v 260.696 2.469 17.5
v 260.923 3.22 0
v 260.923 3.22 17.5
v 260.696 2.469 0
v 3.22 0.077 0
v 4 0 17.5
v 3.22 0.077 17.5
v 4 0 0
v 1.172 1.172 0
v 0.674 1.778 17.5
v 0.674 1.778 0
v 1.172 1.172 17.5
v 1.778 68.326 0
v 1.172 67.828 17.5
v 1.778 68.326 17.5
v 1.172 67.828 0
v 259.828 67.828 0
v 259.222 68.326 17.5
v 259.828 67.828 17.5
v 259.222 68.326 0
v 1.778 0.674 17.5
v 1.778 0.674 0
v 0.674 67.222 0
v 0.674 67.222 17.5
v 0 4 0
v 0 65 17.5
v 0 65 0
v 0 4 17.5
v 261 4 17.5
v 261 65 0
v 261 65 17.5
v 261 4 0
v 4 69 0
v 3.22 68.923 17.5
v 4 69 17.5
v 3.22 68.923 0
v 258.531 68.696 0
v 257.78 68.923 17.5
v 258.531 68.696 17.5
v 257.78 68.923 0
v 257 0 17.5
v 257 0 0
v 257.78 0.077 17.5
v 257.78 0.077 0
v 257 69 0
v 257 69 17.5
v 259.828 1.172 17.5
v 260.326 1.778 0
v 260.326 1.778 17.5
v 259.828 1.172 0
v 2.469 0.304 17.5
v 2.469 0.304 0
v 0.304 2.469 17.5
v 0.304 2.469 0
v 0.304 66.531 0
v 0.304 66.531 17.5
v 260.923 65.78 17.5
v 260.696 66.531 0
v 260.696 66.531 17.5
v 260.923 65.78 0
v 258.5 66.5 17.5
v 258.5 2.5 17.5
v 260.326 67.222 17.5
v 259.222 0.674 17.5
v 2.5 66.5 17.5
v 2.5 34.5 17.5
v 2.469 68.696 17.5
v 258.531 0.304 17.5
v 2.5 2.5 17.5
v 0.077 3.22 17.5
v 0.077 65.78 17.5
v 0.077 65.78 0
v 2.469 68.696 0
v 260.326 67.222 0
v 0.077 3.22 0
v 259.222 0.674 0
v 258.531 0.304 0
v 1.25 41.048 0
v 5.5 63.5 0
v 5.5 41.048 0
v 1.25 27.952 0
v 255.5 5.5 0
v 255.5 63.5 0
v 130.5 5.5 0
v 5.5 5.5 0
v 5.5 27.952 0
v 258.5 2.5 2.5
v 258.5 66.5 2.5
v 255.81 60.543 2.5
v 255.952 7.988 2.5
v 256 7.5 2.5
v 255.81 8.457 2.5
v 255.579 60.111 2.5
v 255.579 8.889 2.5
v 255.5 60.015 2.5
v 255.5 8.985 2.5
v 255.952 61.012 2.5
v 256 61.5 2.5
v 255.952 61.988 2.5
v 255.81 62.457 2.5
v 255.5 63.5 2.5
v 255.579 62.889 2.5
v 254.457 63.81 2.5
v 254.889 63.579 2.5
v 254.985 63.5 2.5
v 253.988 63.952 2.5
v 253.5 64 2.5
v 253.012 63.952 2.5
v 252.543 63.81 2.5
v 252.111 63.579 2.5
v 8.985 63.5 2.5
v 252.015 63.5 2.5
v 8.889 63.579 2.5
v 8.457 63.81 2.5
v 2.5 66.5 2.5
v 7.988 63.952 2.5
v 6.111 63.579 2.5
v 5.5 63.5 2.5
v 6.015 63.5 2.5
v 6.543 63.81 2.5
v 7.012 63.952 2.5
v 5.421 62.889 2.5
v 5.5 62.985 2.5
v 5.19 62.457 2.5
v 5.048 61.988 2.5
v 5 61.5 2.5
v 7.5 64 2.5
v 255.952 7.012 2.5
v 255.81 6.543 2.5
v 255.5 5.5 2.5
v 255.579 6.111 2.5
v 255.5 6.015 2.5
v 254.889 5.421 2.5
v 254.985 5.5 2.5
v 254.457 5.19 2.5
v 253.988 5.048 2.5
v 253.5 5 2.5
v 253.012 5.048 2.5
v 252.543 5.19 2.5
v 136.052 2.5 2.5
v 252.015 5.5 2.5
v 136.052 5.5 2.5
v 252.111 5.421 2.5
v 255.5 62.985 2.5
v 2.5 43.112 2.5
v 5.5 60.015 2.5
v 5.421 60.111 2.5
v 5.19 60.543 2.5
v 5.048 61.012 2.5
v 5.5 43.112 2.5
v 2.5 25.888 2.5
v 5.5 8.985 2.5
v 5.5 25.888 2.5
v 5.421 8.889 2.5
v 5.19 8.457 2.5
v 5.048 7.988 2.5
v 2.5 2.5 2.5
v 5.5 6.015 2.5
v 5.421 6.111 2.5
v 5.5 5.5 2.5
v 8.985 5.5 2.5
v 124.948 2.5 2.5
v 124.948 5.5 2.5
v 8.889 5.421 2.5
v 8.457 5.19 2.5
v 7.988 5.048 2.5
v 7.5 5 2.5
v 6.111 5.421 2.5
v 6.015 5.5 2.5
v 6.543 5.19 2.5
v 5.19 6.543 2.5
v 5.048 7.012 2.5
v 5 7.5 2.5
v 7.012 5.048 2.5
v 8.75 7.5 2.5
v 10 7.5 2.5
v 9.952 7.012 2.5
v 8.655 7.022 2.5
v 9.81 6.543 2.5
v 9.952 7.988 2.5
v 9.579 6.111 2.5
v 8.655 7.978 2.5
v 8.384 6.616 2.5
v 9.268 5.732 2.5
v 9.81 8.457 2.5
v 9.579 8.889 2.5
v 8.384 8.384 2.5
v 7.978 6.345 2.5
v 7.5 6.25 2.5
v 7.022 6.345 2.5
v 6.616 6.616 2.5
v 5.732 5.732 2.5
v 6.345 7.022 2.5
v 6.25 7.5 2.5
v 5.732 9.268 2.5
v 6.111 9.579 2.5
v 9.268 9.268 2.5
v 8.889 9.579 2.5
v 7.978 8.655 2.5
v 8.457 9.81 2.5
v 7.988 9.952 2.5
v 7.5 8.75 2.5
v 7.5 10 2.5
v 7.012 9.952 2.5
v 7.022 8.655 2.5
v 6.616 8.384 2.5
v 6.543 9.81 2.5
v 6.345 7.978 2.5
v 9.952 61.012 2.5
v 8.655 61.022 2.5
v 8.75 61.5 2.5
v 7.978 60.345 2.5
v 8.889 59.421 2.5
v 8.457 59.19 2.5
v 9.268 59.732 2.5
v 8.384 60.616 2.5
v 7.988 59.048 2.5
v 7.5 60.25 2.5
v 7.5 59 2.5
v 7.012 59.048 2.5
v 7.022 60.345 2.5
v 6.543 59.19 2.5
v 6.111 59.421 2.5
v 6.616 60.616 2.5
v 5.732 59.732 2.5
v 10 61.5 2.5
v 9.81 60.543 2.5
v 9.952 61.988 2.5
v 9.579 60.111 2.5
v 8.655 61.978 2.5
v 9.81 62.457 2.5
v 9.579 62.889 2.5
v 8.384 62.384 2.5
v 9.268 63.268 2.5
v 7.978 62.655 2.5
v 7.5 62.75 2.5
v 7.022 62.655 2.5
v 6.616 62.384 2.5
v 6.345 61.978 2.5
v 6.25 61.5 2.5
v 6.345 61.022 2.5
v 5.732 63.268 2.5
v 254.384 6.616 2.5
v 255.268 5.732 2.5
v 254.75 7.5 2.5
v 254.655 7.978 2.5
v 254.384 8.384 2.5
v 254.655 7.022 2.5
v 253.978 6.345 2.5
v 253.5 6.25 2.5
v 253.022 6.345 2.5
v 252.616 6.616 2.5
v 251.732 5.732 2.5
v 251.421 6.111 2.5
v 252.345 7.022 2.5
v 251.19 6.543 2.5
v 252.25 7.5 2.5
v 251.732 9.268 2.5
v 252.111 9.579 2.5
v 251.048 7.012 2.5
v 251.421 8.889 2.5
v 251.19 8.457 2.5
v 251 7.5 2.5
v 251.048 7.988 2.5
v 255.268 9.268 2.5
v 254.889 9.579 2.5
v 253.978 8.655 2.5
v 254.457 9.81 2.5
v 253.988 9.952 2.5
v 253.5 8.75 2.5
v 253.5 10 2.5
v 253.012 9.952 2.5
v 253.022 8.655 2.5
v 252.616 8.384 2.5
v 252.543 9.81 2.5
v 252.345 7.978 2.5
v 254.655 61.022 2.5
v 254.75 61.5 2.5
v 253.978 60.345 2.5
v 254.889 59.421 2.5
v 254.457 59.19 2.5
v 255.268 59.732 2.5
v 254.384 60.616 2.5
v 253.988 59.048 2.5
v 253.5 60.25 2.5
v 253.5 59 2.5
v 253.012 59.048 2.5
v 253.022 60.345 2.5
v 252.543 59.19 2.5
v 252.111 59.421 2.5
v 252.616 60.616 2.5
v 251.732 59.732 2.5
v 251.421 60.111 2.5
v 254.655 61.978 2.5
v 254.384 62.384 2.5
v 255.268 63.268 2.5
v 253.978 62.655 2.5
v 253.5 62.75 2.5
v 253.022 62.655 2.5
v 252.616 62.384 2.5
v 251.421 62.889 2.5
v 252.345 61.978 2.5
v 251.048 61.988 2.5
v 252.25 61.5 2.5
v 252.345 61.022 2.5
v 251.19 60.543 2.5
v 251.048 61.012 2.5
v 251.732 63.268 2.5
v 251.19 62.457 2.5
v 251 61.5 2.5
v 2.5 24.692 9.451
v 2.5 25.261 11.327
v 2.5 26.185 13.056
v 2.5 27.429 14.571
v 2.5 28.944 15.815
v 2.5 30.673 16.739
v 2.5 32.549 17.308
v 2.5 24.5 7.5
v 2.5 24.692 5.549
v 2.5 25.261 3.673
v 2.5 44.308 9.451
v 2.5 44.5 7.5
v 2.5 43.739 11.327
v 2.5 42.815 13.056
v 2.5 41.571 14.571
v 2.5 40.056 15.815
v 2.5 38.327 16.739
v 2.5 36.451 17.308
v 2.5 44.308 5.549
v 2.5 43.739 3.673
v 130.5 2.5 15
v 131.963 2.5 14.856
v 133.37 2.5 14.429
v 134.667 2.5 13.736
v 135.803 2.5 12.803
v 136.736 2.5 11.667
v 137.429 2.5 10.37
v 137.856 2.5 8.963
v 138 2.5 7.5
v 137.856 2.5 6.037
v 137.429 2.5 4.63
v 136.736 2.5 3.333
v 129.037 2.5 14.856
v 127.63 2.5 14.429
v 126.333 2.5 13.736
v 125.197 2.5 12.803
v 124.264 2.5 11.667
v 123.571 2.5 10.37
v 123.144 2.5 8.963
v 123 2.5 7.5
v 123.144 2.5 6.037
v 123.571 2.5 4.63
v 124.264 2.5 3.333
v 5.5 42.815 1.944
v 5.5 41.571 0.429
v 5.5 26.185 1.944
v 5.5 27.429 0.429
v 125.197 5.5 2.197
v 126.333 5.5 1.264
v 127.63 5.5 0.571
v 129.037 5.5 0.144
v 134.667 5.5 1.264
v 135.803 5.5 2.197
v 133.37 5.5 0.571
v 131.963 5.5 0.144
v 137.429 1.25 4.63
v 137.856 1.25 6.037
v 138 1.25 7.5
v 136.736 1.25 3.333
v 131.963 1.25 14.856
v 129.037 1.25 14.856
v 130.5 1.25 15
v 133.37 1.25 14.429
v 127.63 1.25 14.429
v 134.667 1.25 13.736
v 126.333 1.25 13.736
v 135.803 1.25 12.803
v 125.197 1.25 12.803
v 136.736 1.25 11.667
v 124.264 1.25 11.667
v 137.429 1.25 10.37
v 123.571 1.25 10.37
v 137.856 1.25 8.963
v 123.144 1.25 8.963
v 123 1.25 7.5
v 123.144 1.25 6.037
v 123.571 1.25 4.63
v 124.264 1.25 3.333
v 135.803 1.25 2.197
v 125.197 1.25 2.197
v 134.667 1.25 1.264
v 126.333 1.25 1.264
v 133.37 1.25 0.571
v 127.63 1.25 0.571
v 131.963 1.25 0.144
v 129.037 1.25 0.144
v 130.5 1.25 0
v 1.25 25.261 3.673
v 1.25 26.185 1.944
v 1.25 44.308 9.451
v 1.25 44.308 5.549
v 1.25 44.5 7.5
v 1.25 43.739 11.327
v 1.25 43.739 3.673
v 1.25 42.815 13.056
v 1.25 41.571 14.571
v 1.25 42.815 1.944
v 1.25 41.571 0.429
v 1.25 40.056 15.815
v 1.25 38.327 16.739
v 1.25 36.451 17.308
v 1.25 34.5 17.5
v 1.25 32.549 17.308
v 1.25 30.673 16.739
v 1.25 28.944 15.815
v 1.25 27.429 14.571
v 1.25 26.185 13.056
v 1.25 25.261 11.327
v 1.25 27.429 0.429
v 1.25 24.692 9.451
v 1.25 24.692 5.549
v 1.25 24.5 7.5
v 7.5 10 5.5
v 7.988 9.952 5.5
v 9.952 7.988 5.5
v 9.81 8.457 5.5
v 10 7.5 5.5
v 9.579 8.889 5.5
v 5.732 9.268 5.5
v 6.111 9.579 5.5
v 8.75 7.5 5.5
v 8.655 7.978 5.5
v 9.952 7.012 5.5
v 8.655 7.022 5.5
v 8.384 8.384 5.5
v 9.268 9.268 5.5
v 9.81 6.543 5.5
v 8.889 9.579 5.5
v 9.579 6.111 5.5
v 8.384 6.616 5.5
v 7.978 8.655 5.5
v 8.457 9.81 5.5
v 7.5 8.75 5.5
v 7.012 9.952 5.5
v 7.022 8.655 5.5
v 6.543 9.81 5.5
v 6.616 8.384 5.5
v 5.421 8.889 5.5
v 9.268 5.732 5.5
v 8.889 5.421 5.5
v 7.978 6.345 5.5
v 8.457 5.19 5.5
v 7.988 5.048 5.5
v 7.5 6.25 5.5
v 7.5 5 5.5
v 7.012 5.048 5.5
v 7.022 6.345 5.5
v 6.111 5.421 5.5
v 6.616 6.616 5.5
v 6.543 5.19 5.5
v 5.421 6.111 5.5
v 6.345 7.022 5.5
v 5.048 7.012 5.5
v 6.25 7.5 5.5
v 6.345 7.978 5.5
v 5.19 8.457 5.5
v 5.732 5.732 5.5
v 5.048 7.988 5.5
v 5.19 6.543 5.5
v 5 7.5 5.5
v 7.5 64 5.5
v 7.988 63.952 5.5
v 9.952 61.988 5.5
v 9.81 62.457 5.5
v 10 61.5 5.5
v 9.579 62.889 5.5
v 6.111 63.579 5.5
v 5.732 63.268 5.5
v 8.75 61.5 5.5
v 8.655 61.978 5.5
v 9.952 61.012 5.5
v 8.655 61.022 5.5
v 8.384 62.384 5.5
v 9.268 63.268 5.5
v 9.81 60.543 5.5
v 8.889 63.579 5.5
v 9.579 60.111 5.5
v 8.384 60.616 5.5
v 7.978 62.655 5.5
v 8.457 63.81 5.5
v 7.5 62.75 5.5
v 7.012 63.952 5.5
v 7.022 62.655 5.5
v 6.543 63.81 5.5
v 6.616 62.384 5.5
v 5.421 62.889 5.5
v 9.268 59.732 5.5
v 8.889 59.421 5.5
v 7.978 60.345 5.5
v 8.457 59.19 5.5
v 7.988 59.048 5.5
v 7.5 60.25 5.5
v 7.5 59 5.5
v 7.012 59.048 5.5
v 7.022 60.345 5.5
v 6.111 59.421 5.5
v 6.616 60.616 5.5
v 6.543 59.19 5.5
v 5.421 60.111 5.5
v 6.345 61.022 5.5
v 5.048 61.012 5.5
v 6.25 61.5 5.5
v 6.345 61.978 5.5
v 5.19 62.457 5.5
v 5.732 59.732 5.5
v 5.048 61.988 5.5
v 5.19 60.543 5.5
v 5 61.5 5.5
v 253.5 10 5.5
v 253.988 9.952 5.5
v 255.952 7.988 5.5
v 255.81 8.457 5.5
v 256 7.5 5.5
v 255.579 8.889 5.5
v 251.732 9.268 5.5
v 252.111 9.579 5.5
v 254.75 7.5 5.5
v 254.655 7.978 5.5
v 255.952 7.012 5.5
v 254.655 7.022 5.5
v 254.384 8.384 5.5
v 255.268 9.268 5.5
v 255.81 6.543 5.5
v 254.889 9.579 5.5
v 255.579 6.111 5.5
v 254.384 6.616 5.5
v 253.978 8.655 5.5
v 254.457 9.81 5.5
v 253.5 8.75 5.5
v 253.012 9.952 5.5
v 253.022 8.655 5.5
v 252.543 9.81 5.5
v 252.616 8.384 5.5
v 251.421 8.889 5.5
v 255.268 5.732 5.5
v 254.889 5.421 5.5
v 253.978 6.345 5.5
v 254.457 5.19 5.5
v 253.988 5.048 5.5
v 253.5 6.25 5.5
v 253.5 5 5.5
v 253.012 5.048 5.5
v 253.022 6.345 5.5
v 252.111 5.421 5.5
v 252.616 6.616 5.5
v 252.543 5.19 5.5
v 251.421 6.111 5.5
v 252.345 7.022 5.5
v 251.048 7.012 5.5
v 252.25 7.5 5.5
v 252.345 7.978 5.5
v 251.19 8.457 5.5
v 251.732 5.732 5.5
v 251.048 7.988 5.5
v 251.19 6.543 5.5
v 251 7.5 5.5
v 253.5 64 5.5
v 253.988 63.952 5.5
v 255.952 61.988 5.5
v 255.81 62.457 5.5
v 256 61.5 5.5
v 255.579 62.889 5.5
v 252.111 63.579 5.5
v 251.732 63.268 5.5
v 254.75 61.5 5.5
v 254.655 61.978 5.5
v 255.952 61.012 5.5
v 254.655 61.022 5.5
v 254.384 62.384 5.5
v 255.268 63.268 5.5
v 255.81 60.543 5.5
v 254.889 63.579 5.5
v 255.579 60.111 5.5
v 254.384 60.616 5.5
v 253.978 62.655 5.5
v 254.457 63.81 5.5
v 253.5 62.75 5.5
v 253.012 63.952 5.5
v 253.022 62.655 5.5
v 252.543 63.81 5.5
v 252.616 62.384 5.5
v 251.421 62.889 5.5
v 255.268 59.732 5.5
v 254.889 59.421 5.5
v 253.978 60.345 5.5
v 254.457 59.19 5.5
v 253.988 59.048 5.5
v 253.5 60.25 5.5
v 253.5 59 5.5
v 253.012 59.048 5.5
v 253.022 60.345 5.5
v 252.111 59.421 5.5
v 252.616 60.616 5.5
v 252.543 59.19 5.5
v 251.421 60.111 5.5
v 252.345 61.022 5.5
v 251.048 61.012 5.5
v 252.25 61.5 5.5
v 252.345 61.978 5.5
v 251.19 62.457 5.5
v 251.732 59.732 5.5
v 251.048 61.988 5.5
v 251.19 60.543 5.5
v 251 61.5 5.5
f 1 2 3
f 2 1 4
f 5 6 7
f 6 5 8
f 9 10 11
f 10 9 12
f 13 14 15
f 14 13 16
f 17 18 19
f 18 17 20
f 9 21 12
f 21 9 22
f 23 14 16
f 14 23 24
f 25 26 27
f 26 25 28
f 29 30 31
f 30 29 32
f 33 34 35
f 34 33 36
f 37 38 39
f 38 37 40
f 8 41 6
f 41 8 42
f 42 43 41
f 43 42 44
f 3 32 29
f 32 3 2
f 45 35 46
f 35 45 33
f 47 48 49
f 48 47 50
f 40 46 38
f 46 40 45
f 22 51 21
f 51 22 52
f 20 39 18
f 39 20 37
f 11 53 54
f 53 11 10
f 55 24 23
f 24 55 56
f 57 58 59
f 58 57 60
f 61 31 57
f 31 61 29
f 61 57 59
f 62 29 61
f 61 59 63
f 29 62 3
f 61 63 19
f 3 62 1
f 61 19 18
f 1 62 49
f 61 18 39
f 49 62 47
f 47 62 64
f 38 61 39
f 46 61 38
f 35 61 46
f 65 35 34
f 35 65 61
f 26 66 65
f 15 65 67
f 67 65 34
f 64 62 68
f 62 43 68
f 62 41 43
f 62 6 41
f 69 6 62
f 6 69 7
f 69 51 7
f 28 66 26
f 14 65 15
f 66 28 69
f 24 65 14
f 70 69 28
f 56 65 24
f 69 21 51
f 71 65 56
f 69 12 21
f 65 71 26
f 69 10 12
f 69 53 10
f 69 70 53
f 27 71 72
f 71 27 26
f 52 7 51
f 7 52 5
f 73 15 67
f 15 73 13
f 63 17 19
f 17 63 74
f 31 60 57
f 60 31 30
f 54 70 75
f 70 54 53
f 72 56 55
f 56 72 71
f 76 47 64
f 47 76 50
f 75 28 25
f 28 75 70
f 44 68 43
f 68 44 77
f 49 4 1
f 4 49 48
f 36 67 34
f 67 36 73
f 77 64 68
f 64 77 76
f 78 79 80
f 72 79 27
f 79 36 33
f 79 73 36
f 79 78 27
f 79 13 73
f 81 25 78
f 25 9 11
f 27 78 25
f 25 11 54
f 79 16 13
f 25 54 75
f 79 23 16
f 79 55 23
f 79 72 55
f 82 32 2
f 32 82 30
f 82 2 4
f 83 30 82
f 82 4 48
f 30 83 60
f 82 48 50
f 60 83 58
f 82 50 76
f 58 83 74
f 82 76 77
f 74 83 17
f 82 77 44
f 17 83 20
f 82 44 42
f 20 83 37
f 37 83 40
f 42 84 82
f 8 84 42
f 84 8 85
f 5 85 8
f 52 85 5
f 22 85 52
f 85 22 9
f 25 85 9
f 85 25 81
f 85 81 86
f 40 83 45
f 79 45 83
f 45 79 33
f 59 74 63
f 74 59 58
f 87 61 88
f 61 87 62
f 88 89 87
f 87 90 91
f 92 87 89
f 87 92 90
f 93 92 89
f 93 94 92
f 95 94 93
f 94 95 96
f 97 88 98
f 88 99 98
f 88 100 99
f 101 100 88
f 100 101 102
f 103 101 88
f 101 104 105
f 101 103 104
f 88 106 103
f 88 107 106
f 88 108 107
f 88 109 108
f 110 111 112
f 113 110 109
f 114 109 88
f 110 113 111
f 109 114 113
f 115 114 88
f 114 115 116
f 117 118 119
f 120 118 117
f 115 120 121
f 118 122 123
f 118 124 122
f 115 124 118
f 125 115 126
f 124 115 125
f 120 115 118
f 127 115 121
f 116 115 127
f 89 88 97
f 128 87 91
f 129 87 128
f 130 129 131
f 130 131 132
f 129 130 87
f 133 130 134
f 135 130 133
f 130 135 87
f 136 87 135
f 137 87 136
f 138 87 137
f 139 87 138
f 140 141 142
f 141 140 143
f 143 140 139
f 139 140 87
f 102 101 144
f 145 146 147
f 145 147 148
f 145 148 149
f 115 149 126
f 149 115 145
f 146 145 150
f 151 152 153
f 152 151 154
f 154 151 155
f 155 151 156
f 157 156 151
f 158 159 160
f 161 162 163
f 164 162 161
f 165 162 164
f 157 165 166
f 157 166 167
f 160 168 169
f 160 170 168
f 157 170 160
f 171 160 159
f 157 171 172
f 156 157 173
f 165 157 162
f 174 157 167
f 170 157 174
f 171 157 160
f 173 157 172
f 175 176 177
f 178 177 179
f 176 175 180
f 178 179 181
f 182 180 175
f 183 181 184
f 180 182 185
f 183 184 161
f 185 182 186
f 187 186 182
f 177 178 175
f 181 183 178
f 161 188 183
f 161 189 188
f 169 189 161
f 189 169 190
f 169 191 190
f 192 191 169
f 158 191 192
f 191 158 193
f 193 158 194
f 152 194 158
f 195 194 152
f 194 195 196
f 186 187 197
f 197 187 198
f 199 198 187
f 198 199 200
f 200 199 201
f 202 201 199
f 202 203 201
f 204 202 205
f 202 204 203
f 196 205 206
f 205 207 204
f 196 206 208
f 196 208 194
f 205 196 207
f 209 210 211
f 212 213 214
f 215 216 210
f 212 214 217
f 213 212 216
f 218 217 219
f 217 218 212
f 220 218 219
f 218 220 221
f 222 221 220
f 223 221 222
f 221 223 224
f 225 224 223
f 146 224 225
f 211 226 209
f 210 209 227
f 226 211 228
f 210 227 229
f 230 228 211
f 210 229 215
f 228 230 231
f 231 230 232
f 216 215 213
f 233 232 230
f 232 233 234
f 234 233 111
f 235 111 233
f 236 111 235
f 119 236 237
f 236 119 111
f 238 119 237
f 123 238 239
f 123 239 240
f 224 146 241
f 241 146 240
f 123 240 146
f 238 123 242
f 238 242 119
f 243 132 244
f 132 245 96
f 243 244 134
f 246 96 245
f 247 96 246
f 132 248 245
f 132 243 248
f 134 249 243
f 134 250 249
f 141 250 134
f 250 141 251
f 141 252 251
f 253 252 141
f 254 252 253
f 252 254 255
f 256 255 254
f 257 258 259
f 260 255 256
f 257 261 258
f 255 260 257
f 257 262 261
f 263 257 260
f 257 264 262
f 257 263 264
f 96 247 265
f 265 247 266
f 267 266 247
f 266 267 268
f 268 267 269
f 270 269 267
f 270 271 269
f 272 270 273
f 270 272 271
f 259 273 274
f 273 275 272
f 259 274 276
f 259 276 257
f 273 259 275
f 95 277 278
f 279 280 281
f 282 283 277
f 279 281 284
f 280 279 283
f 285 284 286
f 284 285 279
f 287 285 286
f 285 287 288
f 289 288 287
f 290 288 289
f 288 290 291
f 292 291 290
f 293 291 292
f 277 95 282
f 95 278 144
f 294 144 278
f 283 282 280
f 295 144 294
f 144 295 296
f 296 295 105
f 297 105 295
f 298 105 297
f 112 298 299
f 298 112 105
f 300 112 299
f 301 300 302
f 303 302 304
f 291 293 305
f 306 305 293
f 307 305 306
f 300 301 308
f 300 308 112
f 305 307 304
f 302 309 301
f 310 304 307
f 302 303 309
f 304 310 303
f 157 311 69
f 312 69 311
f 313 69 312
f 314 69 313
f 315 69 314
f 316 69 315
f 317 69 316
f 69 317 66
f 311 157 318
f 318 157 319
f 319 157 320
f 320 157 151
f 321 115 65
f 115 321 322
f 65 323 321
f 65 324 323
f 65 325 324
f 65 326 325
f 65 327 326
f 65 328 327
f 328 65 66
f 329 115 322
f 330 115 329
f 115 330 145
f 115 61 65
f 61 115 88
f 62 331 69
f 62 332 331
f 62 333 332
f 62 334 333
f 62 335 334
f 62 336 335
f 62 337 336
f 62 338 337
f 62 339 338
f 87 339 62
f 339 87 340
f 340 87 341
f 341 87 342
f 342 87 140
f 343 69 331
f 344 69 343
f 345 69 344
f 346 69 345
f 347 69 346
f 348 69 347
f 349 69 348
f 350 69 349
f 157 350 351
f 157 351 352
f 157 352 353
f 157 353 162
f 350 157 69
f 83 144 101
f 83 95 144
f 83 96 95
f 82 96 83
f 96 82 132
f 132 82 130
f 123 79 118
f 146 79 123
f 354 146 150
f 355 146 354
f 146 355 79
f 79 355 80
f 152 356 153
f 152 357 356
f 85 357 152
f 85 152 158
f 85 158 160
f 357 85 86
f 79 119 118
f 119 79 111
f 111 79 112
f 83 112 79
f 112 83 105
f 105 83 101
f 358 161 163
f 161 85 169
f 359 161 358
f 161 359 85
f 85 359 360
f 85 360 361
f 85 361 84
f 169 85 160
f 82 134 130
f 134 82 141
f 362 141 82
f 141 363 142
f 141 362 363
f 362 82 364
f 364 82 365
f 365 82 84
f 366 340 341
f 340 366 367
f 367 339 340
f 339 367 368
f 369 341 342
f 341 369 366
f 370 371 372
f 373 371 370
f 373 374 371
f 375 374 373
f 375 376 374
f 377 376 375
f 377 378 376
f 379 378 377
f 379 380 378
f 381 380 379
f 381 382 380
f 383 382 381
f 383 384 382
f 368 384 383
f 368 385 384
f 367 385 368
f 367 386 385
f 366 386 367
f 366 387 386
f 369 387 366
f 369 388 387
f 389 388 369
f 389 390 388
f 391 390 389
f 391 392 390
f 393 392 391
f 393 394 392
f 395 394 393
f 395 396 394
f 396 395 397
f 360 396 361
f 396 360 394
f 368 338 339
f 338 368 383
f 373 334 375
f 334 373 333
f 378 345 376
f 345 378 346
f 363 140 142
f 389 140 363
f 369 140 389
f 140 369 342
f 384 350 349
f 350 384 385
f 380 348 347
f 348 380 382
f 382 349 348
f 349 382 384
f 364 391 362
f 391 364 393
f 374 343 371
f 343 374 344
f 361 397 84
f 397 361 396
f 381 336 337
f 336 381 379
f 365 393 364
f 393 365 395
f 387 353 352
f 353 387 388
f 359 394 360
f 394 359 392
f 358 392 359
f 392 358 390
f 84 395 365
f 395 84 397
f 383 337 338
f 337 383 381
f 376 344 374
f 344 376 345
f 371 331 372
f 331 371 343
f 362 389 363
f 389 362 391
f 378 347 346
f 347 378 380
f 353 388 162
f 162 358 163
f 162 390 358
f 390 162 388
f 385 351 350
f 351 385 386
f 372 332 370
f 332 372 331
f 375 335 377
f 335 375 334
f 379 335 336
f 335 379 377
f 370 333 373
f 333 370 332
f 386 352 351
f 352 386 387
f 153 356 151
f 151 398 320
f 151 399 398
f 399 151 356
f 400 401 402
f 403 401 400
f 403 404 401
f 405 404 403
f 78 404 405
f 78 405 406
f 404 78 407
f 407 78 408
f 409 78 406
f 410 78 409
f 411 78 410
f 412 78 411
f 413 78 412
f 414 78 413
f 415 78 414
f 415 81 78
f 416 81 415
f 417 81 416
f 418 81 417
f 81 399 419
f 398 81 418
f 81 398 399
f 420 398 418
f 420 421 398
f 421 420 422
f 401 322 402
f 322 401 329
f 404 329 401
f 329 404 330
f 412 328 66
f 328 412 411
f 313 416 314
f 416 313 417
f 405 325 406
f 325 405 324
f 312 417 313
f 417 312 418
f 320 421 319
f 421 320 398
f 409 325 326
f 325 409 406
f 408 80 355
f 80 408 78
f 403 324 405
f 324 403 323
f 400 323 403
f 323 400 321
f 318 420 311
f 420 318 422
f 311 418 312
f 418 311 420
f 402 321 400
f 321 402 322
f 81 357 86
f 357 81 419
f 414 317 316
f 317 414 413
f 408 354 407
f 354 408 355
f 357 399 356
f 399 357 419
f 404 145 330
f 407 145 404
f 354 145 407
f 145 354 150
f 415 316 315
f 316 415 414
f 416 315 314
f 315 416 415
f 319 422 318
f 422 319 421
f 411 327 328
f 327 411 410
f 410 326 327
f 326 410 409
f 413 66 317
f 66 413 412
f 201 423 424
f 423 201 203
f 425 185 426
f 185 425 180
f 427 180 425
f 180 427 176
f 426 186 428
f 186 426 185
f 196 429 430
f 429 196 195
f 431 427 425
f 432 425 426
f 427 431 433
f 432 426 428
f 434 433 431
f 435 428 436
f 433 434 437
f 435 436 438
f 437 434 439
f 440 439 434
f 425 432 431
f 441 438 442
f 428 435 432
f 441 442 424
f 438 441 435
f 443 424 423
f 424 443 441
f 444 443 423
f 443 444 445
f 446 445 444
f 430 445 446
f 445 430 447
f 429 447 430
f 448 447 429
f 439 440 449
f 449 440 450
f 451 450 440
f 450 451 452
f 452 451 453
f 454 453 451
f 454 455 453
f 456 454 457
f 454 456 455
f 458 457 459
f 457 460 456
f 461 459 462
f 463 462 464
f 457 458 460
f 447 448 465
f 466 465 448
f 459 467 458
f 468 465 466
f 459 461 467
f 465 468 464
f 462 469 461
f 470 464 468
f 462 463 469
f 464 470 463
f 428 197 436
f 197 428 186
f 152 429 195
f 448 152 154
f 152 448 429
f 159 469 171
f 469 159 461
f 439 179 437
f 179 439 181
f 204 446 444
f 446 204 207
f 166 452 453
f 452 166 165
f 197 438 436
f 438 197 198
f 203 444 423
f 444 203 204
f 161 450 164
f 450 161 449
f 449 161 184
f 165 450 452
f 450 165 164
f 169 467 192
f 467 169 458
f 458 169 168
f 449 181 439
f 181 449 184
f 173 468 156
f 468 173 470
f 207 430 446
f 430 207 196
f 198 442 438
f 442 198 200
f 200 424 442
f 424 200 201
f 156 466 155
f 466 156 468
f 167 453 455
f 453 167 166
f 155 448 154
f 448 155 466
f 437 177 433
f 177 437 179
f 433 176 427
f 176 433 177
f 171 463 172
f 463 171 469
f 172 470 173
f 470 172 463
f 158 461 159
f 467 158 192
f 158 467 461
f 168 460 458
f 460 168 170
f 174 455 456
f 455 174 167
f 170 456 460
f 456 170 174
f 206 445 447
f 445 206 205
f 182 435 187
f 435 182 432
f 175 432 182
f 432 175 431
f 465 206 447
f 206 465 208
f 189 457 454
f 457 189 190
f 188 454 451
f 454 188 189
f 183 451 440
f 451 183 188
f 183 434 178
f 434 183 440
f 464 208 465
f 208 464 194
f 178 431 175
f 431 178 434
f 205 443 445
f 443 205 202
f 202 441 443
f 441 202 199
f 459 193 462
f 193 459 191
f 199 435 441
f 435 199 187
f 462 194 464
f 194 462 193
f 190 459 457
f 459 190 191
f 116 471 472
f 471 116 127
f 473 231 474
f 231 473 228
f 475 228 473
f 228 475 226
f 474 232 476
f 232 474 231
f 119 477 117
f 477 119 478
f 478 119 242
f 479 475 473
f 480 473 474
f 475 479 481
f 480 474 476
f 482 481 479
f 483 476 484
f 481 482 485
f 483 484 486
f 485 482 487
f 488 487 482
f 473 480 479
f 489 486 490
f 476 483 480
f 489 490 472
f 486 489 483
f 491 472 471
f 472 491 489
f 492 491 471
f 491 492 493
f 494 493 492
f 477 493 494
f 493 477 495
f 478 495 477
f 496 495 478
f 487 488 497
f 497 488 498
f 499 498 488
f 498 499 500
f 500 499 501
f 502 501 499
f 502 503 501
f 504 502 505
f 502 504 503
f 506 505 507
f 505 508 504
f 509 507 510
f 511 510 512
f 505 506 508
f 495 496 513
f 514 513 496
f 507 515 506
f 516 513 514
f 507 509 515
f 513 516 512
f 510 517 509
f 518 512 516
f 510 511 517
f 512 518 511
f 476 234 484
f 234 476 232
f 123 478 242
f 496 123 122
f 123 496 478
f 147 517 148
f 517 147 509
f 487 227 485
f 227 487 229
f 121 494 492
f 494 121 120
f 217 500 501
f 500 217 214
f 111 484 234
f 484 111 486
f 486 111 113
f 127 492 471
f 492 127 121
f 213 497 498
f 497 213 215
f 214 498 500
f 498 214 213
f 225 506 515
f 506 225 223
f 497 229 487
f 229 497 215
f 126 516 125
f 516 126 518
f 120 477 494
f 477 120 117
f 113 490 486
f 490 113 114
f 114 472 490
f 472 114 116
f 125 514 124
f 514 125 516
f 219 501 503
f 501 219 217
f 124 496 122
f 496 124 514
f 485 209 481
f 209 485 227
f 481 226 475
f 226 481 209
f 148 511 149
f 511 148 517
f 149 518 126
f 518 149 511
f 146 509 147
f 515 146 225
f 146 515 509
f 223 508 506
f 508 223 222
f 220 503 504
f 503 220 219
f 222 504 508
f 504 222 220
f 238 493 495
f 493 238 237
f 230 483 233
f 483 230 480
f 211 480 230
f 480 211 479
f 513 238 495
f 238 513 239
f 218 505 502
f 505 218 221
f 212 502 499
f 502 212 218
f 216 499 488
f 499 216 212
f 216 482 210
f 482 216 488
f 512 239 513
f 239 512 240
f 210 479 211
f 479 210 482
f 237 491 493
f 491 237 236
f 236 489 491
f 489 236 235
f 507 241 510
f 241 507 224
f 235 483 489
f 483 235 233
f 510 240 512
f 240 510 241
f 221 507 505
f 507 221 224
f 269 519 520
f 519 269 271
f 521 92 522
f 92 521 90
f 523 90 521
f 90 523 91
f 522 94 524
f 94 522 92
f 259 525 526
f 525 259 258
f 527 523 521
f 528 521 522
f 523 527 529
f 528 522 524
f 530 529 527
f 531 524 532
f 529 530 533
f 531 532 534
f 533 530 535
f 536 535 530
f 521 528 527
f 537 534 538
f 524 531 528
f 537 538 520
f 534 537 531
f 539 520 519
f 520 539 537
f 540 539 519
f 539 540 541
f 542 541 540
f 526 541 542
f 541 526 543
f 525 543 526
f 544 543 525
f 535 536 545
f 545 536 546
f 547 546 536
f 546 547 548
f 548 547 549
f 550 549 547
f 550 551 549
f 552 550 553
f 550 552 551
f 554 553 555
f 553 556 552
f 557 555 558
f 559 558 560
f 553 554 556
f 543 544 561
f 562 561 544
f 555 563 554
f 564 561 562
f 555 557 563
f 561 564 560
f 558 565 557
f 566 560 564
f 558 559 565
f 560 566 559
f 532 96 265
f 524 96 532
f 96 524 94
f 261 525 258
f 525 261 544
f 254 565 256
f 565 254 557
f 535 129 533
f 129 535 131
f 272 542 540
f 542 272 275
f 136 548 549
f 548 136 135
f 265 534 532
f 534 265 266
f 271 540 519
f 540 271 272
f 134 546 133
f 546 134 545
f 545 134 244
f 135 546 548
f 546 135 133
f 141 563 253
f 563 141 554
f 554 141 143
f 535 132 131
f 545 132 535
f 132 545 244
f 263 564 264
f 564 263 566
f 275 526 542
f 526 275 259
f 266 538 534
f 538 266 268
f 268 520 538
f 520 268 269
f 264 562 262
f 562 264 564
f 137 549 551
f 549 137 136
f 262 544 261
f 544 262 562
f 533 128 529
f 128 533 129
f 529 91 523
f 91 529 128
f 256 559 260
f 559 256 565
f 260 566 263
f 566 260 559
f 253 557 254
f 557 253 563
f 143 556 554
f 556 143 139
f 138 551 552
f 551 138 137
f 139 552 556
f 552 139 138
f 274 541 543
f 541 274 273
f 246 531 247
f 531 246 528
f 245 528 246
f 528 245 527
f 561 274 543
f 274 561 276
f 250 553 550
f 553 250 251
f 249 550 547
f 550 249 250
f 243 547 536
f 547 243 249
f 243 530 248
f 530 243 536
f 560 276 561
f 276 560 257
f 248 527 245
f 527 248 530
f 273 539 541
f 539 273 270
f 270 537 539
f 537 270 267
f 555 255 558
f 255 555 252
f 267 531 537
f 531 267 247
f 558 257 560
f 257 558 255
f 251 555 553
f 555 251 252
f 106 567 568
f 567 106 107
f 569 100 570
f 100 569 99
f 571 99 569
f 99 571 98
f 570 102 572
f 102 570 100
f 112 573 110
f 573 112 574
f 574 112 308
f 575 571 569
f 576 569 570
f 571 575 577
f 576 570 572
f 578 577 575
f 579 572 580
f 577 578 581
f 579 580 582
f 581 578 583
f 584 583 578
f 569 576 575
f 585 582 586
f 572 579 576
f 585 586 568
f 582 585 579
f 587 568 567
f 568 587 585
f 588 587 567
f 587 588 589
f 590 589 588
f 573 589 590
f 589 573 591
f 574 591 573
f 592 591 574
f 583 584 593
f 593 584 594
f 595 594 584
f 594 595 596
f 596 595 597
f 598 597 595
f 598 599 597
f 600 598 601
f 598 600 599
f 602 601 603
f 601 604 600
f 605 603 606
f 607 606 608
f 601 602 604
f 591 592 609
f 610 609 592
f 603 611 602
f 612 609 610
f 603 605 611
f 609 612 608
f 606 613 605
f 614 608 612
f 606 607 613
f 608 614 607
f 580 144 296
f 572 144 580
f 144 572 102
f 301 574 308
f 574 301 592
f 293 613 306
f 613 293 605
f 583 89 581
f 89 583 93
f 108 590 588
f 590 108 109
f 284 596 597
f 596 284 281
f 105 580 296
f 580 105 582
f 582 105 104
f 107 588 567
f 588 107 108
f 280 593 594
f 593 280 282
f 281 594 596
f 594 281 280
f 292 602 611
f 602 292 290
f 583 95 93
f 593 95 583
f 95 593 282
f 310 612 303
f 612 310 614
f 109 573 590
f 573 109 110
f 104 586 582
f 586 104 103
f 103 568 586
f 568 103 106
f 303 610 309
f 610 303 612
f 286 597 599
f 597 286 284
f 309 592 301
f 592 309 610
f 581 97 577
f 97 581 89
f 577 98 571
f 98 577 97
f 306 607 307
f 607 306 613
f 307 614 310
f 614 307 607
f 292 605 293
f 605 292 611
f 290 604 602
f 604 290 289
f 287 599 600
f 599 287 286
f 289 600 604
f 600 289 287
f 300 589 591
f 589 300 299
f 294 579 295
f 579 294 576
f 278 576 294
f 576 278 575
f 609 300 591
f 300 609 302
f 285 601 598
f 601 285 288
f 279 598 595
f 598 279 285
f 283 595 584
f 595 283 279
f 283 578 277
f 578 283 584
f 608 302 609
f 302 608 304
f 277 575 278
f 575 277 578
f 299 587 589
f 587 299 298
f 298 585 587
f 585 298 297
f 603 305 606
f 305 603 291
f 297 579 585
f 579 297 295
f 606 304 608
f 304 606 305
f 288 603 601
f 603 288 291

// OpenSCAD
// 8x32 WS2812B LED Matrix Case for Raspberry Pi
// Designed for Bambu P1S 3D Printer
// Made with Bob

// ===== CONFIGURATION =====

// LED Matrix dimensions (adjust to your actual matrix)
matrix_width = 256;  // 32 pixels * 8mm per pixel
matrix_height = 64;  // 8 pixels * 8mm per pixel
matrix_depth = 10;   // Thickness of LED matrix PCB

// Case parameters
wall_thickness = 2.5;
front_lip = 3;       // Lip to hold matrix in place
back_clearance = 15; // Space behind matrix for wiring
mounting_hole_dia = 3.5;  // M3 screw holes
corner_radius = 4;

// Diffuser parameters
diffuser_thickness = 2;
diffuser_gap = 5;    // Gap between LEDs and diffuser

// Stand parameters
stand_angle = 15;    // Tilt angle in degrees
stand_depth = 40;

// ===== MODULES =====

module rounded_box(width, height, depth, radius) {
    hull() {
        for (x = [radius, width - radius]) {
            for (y = [radius, height - radius]) {
                translate([x, y, 0])
                    cylinder(h=depth, r=radius, $fn=32);
            }
        }
    }
}

module case_back() {
    difference() {
        // Main case body
        rounded_box(
            matrix_width + 2*wall_thickness,
            matrix_height + 2*wall_thickness,
            back_clearance + wall_thickness,
            corner_radius
        );
        
        // Matrix cavity
        translate([wall_thickness, wall_thickness, wall_thickness])
            cube([matrix_width, matrix_height, back_clearance + 1]);
        
        // Front opening (with lip)
        translate([wall_thickness + front_lip, 
                   wall_thickness + front_lip, 
                   -1])
            cube([matrix_width - 2*front_lip, 
                  matrix_height - 2*front_lip, 
                  wall_thickness + 2]);
        
        // Wire management holes
        // Bottom center for power/data
        translate([matrix_width/2 + wall_thickness, 
                   wall_thickness/2, 
                   back_clearance/2])
            rotate([-90, 0, 0])
                cylinder(h=wall_thickness + 2, d=15, $fn=32);
        
        // Side hole for Raspberry Pi connection
        translate([wall_thickness/2, 
                   matrix_height/2 + wall_thickness, 
                   back_clearance/2])
            rotate([0, 90, 0])
                cylinder(h=wall_thickness + 2, d=20, $fn=32);
    }
    
    // Mounting posts for matrix (optional - use if matrix has mounting holes)
    post_inset = 5;
    post_height = 3;
    post_dia = 5;
    
    for (x = [post_inset, matrix_width - post_inset]) {
        for (y = [post_inset, matrix_height - post_inset]) {
            translate([wall_thickness + x, 
                       wall_thickness + y, 
                       wall_thickness]) {
                difference() {
                    cylinder(h=post_height, d=post_dia, $fn=32);
                    translate([0, 0, -1])
                        cylinder(h=post_height + 2, d=2.5, $fn=16);
                }
            }
        }
    }
}

module diffuser_frame() {
    difference() {
        // Outer frame
        rounded_box(
            matrix_width + 2*wall_thickness,
            matrix_height + 2*wall_thickness,
            diffuser_thickness,
            corner_radius
        );
        
        // Inner cutout for diffuser material
        translate([wall_thickness, wall_thickness, -1])
            cube([matrix_width, matrix_height, diffuser_thickness + 2]);
    }
}

module stand() {
    stand_width = matrix_width + 2*wall_thickness;
    stand_height = stand_depth * sin(stand_angle);
    stand_base = stand_depth * cos(stand_angle);
    
    difference() {
        union() {
            // Angled support
            hull() {
                cube([stand_width, wall_thickness, 0.1]);
                translate([0, stand_base, stand_height])
                    cube([stand_width, wall_thickness, 0.1]);
            }
            
            // Base
            cube([stand_width, stand_base + wall_thickness, wall_thickness]);
            
            // Back support
            translate([0, stand_base, 0])
                cube([stand_width, wall_thickness, stand_height + wall_thickness]);
        }
        
        // Mounting holes for case
        mount_spacing = 20;
        for (x = [mount_spacing, stand_width - mount_spacing]) {
            translate([x, stand_base + wall_thickness/2, stand_height])
                rotate([-90, 0, 0])
                    cylinder(h=wall_thickness + 2, d=mounting_hole_dia, $fn=16);
        }
    }
}

module wall_mount_bracket() {
    bracket_width = matrix_width + 2*wall_thickness;
    bracket_height = 40;
    
    difference() {
        union() {
            // Main plate
            cube([bracket_width, wall_thickness, bracket_height]);
            
            // Mounting tabs
            for (x = [10, bracket_width - 10]) {
                translate([x - 5, 0, bracket_height - 15])
                    cube([10, wall_thickness + 5, 10]);
            }
        }
        
        // Wall mounting holes
        for (x = [10, bracket_width - 10]) {
            translate([x, -1, bracket_height - 10])
                rotate([-90, 0, 0])
                    cylinder(h=wall_thickness + 7, d=4, $fn=16);
        }
        
        // Case mounting holes
        mount_spacing = 20;
        for (x = [mount_spacing, bracket_width - mount_spacing]) {
            translate([x, wall_thickness/2, 10])
                rotate([-90, 0, 0])
                    cylinder(h=wall_thickness + 2, d=mounting_hole_dia, $fn=16);
        }
    }
}

// ===== RENDER SELECTION =====

// Uncomment the part you want to print:

// Main case back (print this first)
case_back();

// Diffuser frame (optional - holds acrylic or paper diffuser)
//translate([0, matrix_height + 2*wall_thickness + 10, 0])
//    diffuser_frame();

// Desktop stand (optional)
//translate([0, -(stand_depth * cos(stand_angle) + 10), 0])
//    stand();

// Wall mount bracket (optional)
//translate([matrix_width + 2*wall_thickness + 10, 0, 0])
//    wall_mount_bracket();

// ===== PRINT NOTES =====
// 1. Print case_back with supports for wire holes
// 2. Use 0.2mm layer height, 20% infill
// 3. PLA or PETG recommended
// 4. Print time: ~3-4 hours for case_back
// 5. For diffuser: use white acrylic sheet or frosted plastic
